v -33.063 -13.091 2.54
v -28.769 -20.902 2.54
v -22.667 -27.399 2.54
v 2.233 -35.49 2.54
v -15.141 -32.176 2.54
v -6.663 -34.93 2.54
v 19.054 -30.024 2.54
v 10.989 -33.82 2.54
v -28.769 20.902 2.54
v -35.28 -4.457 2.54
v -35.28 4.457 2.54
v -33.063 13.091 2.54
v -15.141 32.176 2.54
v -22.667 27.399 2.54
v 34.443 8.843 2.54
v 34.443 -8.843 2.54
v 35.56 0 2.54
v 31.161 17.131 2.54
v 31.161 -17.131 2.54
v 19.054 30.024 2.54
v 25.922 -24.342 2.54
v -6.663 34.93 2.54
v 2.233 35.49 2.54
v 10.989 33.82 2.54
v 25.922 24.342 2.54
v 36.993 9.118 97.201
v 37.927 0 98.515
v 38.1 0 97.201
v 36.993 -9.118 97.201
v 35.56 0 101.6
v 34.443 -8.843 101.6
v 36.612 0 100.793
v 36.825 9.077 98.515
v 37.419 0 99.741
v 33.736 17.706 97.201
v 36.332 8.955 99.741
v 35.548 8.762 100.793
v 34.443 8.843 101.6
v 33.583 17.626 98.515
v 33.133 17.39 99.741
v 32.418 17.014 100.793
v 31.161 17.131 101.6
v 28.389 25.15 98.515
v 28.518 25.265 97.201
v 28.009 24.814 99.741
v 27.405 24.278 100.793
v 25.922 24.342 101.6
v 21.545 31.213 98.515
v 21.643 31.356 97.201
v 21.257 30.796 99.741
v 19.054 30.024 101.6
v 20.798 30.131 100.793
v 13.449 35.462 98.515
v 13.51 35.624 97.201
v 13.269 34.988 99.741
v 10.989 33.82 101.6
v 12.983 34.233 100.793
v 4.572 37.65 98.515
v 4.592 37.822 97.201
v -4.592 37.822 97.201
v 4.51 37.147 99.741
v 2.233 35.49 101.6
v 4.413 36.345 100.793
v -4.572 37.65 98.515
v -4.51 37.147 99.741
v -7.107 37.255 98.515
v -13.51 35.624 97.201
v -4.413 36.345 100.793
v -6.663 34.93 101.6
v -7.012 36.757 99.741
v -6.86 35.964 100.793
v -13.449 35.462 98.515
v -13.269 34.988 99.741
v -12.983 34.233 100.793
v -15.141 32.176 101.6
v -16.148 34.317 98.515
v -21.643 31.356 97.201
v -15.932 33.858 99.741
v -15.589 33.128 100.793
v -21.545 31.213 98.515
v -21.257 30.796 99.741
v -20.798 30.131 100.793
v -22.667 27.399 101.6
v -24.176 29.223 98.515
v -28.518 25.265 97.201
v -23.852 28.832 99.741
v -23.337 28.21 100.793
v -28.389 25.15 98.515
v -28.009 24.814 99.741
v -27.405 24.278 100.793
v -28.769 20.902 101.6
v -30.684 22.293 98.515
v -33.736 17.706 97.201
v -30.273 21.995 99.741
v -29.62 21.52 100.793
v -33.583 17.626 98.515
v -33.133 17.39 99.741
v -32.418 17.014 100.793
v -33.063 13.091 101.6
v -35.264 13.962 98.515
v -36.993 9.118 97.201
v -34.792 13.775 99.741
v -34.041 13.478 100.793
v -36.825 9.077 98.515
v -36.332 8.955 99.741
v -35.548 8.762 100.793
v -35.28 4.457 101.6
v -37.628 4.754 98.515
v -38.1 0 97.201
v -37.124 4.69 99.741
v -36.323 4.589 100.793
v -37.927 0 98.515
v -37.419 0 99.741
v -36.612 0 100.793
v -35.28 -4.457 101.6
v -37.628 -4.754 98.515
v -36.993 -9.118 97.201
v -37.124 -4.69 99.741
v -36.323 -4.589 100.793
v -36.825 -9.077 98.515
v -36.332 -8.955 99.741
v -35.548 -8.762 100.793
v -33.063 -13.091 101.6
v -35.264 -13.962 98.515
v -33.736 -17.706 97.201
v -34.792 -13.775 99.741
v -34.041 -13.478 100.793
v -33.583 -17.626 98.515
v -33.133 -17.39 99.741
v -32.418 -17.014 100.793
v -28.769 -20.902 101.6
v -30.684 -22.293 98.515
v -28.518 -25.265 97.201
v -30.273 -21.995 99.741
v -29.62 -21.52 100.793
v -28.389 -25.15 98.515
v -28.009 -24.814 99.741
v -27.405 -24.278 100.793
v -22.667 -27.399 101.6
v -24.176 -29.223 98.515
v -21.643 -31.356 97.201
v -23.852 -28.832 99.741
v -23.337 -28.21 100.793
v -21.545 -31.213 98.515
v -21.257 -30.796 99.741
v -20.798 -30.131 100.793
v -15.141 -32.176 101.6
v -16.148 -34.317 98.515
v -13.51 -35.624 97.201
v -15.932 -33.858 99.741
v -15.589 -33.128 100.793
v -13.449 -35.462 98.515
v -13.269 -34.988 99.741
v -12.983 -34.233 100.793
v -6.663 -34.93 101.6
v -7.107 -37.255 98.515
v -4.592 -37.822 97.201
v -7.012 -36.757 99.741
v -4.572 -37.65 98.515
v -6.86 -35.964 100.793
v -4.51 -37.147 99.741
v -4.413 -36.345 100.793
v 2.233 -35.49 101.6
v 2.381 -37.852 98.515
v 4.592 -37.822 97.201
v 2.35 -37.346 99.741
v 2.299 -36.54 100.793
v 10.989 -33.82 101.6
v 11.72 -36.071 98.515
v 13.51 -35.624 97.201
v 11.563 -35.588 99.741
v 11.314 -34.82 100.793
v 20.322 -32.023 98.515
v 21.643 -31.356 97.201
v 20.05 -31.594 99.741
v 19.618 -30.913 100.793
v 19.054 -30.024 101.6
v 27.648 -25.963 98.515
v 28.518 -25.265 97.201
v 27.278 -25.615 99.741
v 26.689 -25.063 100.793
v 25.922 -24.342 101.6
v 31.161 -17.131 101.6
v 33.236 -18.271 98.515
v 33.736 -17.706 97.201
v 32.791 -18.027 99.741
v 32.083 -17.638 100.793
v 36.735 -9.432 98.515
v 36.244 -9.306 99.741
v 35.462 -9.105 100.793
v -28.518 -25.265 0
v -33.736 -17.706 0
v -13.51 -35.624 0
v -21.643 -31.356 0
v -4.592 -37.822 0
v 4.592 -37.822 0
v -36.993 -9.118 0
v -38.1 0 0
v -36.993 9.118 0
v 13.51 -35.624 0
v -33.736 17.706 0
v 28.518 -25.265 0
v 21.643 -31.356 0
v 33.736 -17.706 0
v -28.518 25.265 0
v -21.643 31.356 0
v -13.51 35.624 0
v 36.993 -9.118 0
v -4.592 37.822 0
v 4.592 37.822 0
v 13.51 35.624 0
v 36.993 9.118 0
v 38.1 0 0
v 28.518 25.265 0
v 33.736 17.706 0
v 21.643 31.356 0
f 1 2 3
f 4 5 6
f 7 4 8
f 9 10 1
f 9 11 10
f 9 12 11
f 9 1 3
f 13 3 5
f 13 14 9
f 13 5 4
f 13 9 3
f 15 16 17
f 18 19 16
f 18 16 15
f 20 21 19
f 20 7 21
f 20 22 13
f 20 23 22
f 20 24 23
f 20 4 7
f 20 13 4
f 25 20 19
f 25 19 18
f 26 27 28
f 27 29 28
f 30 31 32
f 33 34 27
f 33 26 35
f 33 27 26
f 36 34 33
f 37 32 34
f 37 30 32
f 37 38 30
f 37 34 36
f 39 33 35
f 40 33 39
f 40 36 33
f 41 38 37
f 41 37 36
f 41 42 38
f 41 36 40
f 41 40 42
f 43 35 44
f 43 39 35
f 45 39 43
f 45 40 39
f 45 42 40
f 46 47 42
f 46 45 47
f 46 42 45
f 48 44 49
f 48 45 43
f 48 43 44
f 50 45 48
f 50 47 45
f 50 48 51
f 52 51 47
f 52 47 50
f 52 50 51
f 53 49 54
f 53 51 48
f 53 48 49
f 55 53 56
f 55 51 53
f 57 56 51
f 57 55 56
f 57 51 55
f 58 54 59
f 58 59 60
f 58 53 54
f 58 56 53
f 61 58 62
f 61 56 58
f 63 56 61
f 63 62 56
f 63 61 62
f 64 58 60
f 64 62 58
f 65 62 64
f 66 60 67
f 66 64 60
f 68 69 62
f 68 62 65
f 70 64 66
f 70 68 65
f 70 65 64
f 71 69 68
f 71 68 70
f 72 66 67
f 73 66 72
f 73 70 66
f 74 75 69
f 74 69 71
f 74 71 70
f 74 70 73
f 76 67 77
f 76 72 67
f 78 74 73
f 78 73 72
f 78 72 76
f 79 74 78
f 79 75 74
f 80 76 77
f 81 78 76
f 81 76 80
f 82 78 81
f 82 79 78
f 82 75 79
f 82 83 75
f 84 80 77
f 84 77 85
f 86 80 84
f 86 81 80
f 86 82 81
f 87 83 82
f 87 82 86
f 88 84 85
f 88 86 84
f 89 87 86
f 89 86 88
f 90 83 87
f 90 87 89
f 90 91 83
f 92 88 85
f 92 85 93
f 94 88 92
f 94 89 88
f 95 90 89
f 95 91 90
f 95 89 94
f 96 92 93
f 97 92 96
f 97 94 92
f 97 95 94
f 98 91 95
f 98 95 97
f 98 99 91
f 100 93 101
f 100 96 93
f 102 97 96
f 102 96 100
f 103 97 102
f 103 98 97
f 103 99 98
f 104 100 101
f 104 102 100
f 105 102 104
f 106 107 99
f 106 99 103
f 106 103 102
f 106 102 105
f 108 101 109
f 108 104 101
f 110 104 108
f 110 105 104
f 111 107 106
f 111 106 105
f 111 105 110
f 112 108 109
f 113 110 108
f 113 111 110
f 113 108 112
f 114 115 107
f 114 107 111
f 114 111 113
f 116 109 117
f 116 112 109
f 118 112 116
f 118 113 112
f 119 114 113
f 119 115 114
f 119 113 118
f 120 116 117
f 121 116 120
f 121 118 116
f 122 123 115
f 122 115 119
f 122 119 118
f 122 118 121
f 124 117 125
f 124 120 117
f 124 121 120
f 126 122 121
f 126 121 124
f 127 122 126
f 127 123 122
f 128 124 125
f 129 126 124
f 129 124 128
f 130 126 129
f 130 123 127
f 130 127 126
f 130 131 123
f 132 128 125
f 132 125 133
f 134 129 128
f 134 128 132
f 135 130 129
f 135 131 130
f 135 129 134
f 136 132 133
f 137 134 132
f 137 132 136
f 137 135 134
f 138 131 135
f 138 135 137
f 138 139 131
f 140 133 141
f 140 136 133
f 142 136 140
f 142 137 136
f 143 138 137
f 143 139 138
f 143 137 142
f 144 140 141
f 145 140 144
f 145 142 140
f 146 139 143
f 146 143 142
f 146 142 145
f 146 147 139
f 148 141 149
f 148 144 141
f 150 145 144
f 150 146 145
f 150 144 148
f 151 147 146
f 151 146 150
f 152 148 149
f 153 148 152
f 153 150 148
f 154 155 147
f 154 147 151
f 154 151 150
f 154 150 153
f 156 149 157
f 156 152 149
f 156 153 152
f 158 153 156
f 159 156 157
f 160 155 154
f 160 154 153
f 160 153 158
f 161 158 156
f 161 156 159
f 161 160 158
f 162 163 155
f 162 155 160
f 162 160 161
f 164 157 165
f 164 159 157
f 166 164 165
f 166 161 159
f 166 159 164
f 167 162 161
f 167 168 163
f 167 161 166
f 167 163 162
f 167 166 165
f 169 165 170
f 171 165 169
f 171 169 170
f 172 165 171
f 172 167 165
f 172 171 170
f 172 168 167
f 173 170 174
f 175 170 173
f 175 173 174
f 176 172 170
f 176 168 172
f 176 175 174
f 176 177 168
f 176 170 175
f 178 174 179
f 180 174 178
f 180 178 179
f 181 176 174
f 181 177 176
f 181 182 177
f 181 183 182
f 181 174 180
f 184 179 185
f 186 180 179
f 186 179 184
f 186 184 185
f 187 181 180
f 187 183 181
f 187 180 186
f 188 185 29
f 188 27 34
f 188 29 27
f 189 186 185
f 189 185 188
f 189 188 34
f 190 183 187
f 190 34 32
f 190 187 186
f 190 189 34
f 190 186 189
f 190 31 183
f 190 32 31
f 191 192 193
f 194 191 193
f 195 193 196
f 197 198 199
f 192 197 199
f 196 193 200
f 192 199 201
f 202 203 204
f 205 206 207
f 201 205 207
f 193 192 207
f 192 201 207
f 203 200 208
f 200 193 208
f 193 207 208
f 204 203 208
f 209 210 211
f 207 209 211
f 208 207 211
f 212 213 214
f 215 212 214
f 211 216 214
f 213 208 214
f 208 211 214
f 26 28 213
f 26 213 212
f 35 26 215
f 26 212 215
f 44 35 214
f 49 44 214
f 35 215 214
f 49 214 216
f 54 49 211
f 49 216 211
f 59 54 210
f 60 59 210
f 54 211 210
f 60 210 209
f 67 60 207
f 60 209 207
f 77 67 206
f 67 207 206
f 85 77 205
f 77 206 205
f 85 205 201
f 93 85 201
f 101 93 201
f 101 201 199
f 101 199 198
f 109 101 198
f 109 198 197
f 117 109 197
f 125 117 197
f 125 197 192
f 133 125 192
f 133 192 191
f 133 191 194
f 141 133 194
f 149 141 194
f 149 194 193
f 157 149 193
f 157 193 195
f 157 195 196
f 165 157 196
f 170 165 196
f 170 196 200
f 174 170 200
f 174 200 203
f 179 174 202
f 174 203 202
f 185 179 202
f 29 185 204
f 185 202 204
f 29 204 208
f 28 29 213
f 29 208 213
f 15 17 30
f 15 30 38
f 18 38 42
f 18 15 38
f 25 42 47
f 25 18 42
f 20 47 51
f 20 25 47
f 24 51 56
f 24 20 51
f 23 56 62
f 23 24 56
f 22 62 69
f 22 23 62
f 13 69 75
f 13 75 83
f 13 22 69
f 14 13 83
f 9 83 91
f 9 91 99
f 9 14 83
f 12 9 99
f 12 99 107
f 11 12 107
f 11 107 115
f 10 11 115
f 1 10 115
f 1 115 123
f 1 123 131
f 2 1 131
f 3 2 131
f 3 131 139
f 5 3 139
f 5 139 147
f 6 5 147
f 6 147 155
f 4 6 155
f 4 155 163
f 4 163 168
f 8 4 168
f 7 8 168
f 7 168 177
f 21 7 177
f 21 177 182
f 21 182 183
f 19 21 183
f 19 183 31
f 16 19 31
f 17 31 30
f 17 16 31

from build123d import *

# Parameters (mm, degrees)
F0_R     = 38.1
F1_DEPTH = 101.6
F2_T     = -2.54


# Not quite as in the source:
# - a fillet or chamfer that OpenCascade refuses, or shapes differently, is made with other operations: its cross-section is extruded or revolved along the edge and cut away or added


with BuildPart() as f1:
    # F0 (on Top) → F1 (new body)
    with BuildSketch(Plane.XY):
        Circle(F0_R)
    extrude(amount=F1_DEPTH)

    # F2
    f2_openings = [f1.faces().sort_by_distance(p)[0] for p in [
        (0, 0, 101.6),
    ]]
    offset(amount=F2_T, openings=f2_openings)

    # F3: fillet of radius 5.08 on 1 edges, made by hand

    # F3_s1 → F3_t2 (revolve, cut)
    with BuildSketch(Plane.XZ):
        with BuildLine():
            ThreePointArc((38.1, 97.2005909488), (37.4194090512, 99.7405909488), (35.56, 101.6))
            Line((35.56, 101.6), (38.1, 101.6))
            Line((38.1, 101.6), (38.1, 97.2005909488))
        make_face()
    revolve(axis=Axis((0, 0, 101.6), (0, 0, 1)), mode=Mode.SUBTRACT)


solid = f1.part
